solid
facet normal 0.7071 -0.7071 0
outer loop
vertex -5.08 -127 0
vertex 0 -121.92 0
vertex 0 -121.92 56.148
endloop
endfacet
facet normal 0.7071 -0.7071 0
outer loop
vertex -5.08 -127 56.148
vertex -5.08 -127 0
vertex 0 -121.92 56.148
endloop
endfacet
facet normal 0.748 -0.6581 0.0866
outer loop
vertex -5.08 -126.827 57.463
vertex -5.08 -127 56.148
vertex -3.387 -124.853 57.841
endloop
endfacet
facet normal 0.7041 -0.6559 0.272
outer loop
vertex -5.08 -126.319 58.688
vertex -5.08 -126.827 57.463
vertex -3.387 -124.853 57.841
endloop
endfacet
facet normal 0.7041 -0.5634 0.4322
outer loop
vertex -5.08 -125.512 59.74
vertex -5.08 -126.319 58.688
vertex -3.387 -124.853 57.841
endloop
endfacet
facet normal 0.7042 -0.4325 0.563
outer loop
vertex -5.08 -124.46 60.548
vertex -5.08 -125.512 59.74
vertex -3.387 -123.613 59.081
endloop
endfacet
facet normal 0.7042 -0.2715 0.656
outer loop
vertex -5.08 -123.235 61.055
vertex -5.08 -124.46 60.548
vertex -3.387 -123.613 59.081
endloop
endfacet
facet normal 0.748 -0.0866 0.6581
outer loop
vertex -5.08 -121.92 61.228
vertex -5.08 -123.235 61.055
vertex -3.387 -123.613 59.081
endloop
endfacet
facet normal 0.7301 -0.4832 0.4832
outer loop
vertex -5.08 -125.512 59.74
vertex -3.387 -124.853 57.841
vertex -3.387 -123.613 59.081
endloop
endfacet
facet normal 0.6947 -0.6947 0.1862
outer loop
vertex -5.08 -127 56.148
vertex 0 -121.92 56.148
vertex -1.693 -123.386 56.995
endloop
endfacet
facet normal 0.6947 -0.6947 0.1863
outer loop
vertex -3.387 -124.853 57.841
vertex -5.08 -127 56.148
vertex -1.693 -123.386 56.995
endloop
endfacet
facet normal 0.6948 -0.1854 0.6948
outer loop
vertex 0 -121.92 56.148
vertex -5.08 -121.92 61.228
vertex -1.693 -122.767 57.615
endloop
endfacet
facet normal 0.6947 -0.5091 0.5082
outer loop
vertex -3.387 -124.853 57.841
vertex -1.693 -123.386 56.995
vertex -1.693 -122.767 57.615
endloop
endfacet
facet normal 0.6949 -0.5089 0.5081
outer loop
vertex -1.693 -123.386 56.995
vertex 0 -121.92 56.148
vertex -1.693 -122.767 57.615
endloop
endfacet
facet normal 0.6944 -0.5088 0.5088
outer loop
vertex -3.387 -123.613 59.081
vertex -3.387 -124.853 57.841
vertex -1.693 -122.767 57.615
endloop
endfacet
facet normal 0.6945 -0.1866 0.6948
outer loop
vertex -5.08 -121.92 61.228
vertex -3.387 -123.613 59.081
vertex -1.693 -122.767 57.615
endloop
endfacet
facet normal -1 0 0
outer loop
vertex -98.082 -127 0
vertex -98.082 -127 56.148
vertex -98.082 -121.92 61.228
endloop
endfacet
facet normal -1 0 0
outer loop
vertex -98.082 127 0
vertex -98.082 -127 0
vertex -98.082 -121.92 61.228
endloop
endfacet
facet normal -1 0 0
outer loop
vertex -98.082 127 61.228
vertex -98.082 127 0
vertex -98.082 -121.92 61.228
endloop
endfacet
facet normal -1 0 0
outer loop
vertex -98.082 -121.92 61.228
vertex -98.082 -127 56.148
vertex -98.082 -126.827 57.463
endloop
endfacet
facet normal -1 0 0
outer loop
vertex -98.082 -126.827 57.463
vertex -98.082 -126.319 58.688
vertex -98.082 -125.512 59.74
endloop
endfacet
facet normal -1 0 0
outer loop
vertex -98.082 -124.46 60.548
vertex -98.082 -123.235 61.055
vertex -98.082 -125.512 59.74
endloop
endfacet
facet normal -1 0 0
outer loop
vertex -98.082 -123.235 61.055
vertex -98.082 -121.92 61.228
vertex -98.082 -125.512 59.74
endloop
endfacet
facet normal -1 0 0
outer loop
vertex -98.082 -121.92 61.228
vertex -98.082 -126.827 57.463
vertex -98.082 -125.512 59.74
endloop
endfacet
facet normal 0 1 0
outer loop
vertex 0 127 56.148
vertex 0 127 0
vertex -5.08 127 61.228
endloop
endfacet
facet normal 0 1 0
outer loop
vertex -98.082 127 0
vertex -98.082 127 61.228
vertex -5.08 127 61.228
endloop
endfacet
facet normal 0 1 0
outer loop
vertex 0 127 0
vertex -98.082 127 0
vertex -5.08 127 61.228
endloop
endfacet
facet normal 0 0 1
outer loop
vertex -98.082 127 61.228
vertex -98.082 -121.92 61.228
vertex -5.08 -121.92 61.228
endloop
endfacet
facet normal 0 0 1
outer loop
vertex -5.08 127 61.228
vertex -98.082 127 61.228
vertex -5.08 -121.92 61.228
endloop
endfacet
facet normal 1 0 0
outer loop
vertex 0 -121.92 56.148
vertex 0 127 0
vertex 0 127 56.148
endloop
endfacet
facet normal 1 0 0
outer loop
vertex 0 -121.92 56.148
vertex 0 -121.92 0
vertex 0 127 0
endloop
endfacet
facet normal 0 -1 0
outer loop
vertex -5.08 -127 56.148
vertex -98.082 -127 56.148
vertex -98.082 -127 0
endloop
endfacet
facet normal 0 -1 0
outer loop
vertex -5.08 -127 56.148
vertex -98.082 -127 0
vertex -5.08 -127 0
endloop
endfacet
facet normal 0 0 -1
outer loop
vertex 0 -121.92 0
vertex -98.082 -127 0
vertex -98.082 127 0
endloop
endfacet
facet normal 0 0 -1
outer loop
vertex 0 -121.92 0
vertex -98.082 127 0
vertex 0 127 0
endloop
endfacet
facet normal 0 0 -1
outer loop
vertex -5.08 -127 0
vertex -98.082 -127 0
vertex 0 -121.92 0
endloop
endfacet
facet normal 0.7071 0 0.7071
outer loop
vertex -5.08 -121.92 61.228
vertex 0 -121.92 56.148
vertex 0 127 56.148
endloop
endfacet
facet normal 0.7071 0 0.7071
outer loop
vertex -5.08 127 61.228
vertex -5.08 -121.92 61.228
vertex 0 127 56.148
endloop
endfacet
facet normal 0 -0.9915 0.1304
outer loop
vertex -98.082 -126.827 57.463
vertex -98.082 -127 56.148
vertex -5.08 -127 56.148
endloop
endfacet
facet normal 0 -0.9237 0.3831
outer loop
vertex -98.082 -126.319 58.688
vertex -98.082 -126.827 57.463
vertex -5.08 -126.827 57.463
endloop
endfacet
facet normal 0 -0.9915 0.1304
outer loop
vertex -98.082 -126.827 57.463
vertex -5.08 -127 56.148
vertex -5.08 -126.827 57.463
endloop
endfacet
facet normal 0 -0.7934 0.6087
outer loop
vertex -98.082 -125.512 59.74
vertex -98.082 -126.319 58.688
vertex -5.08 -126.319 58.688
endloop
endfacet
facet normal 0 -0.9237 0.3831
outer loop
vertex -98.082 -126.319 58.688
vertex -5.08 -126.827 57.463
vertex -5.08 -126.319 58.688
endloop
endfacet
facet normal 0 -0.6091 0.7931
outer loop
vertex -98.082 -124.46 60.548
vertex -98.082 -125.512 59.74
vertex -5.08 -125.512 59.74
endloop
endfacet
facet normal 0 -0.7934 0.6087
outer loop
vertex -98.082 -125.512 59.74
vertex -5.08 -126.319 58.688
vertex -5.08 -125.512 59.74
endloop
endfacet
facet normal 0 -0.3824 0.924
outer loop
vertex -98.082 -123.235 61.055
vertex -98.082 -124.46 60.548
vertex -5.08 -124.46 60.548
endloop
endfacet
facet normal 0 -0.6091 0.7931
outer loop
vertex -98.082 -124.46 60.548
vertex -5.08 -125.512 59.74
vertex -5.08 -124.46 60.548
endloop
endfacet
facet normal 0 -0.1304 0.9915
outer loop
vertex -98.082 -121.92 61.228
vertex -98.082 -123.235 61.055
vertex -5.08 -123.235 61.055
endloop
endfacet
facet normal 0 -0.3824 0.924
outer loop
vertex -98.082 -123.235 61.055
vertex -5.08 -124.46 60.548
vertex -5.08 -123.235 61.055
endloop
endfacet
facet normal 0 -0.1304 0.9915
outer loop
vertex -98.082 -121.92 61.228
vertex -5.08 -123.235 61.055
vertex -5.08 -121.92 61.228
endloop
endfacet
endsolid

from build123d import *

# Parameters (mm, degrees)
F0_W     = 98.08211
F0_H     = 61.228119
F1_DEPTH = 127
F2_R     = 5.08
F3_SIZE  = 5.08


with BuildPart() as f1:
    # F0 (on Front) → F1 (new body, symmetric)
    with BuildSketch(Plane.XZ):
        with Locations((-49.041055, 30.614059)):
            Rectangle(F0_W, F0_H)
    extrude(amount=F1_DEPTH, both=True)

    # F2
    f2_edges = [f1.edges().sort_by_distance(p)[0] for p in [
        (-49.041055, -127, 61.228119),
    ]]
    fillet(f2_edges, radius=F2_R)

    # F3
    f3_edges = [f1.edges().sort_by_distance(p)[0] for p in [
        (0, 2.54, 61.228119),
    ]]
    chamfer(f3_edges, length=F3_SIZE)


solid = f1.part
